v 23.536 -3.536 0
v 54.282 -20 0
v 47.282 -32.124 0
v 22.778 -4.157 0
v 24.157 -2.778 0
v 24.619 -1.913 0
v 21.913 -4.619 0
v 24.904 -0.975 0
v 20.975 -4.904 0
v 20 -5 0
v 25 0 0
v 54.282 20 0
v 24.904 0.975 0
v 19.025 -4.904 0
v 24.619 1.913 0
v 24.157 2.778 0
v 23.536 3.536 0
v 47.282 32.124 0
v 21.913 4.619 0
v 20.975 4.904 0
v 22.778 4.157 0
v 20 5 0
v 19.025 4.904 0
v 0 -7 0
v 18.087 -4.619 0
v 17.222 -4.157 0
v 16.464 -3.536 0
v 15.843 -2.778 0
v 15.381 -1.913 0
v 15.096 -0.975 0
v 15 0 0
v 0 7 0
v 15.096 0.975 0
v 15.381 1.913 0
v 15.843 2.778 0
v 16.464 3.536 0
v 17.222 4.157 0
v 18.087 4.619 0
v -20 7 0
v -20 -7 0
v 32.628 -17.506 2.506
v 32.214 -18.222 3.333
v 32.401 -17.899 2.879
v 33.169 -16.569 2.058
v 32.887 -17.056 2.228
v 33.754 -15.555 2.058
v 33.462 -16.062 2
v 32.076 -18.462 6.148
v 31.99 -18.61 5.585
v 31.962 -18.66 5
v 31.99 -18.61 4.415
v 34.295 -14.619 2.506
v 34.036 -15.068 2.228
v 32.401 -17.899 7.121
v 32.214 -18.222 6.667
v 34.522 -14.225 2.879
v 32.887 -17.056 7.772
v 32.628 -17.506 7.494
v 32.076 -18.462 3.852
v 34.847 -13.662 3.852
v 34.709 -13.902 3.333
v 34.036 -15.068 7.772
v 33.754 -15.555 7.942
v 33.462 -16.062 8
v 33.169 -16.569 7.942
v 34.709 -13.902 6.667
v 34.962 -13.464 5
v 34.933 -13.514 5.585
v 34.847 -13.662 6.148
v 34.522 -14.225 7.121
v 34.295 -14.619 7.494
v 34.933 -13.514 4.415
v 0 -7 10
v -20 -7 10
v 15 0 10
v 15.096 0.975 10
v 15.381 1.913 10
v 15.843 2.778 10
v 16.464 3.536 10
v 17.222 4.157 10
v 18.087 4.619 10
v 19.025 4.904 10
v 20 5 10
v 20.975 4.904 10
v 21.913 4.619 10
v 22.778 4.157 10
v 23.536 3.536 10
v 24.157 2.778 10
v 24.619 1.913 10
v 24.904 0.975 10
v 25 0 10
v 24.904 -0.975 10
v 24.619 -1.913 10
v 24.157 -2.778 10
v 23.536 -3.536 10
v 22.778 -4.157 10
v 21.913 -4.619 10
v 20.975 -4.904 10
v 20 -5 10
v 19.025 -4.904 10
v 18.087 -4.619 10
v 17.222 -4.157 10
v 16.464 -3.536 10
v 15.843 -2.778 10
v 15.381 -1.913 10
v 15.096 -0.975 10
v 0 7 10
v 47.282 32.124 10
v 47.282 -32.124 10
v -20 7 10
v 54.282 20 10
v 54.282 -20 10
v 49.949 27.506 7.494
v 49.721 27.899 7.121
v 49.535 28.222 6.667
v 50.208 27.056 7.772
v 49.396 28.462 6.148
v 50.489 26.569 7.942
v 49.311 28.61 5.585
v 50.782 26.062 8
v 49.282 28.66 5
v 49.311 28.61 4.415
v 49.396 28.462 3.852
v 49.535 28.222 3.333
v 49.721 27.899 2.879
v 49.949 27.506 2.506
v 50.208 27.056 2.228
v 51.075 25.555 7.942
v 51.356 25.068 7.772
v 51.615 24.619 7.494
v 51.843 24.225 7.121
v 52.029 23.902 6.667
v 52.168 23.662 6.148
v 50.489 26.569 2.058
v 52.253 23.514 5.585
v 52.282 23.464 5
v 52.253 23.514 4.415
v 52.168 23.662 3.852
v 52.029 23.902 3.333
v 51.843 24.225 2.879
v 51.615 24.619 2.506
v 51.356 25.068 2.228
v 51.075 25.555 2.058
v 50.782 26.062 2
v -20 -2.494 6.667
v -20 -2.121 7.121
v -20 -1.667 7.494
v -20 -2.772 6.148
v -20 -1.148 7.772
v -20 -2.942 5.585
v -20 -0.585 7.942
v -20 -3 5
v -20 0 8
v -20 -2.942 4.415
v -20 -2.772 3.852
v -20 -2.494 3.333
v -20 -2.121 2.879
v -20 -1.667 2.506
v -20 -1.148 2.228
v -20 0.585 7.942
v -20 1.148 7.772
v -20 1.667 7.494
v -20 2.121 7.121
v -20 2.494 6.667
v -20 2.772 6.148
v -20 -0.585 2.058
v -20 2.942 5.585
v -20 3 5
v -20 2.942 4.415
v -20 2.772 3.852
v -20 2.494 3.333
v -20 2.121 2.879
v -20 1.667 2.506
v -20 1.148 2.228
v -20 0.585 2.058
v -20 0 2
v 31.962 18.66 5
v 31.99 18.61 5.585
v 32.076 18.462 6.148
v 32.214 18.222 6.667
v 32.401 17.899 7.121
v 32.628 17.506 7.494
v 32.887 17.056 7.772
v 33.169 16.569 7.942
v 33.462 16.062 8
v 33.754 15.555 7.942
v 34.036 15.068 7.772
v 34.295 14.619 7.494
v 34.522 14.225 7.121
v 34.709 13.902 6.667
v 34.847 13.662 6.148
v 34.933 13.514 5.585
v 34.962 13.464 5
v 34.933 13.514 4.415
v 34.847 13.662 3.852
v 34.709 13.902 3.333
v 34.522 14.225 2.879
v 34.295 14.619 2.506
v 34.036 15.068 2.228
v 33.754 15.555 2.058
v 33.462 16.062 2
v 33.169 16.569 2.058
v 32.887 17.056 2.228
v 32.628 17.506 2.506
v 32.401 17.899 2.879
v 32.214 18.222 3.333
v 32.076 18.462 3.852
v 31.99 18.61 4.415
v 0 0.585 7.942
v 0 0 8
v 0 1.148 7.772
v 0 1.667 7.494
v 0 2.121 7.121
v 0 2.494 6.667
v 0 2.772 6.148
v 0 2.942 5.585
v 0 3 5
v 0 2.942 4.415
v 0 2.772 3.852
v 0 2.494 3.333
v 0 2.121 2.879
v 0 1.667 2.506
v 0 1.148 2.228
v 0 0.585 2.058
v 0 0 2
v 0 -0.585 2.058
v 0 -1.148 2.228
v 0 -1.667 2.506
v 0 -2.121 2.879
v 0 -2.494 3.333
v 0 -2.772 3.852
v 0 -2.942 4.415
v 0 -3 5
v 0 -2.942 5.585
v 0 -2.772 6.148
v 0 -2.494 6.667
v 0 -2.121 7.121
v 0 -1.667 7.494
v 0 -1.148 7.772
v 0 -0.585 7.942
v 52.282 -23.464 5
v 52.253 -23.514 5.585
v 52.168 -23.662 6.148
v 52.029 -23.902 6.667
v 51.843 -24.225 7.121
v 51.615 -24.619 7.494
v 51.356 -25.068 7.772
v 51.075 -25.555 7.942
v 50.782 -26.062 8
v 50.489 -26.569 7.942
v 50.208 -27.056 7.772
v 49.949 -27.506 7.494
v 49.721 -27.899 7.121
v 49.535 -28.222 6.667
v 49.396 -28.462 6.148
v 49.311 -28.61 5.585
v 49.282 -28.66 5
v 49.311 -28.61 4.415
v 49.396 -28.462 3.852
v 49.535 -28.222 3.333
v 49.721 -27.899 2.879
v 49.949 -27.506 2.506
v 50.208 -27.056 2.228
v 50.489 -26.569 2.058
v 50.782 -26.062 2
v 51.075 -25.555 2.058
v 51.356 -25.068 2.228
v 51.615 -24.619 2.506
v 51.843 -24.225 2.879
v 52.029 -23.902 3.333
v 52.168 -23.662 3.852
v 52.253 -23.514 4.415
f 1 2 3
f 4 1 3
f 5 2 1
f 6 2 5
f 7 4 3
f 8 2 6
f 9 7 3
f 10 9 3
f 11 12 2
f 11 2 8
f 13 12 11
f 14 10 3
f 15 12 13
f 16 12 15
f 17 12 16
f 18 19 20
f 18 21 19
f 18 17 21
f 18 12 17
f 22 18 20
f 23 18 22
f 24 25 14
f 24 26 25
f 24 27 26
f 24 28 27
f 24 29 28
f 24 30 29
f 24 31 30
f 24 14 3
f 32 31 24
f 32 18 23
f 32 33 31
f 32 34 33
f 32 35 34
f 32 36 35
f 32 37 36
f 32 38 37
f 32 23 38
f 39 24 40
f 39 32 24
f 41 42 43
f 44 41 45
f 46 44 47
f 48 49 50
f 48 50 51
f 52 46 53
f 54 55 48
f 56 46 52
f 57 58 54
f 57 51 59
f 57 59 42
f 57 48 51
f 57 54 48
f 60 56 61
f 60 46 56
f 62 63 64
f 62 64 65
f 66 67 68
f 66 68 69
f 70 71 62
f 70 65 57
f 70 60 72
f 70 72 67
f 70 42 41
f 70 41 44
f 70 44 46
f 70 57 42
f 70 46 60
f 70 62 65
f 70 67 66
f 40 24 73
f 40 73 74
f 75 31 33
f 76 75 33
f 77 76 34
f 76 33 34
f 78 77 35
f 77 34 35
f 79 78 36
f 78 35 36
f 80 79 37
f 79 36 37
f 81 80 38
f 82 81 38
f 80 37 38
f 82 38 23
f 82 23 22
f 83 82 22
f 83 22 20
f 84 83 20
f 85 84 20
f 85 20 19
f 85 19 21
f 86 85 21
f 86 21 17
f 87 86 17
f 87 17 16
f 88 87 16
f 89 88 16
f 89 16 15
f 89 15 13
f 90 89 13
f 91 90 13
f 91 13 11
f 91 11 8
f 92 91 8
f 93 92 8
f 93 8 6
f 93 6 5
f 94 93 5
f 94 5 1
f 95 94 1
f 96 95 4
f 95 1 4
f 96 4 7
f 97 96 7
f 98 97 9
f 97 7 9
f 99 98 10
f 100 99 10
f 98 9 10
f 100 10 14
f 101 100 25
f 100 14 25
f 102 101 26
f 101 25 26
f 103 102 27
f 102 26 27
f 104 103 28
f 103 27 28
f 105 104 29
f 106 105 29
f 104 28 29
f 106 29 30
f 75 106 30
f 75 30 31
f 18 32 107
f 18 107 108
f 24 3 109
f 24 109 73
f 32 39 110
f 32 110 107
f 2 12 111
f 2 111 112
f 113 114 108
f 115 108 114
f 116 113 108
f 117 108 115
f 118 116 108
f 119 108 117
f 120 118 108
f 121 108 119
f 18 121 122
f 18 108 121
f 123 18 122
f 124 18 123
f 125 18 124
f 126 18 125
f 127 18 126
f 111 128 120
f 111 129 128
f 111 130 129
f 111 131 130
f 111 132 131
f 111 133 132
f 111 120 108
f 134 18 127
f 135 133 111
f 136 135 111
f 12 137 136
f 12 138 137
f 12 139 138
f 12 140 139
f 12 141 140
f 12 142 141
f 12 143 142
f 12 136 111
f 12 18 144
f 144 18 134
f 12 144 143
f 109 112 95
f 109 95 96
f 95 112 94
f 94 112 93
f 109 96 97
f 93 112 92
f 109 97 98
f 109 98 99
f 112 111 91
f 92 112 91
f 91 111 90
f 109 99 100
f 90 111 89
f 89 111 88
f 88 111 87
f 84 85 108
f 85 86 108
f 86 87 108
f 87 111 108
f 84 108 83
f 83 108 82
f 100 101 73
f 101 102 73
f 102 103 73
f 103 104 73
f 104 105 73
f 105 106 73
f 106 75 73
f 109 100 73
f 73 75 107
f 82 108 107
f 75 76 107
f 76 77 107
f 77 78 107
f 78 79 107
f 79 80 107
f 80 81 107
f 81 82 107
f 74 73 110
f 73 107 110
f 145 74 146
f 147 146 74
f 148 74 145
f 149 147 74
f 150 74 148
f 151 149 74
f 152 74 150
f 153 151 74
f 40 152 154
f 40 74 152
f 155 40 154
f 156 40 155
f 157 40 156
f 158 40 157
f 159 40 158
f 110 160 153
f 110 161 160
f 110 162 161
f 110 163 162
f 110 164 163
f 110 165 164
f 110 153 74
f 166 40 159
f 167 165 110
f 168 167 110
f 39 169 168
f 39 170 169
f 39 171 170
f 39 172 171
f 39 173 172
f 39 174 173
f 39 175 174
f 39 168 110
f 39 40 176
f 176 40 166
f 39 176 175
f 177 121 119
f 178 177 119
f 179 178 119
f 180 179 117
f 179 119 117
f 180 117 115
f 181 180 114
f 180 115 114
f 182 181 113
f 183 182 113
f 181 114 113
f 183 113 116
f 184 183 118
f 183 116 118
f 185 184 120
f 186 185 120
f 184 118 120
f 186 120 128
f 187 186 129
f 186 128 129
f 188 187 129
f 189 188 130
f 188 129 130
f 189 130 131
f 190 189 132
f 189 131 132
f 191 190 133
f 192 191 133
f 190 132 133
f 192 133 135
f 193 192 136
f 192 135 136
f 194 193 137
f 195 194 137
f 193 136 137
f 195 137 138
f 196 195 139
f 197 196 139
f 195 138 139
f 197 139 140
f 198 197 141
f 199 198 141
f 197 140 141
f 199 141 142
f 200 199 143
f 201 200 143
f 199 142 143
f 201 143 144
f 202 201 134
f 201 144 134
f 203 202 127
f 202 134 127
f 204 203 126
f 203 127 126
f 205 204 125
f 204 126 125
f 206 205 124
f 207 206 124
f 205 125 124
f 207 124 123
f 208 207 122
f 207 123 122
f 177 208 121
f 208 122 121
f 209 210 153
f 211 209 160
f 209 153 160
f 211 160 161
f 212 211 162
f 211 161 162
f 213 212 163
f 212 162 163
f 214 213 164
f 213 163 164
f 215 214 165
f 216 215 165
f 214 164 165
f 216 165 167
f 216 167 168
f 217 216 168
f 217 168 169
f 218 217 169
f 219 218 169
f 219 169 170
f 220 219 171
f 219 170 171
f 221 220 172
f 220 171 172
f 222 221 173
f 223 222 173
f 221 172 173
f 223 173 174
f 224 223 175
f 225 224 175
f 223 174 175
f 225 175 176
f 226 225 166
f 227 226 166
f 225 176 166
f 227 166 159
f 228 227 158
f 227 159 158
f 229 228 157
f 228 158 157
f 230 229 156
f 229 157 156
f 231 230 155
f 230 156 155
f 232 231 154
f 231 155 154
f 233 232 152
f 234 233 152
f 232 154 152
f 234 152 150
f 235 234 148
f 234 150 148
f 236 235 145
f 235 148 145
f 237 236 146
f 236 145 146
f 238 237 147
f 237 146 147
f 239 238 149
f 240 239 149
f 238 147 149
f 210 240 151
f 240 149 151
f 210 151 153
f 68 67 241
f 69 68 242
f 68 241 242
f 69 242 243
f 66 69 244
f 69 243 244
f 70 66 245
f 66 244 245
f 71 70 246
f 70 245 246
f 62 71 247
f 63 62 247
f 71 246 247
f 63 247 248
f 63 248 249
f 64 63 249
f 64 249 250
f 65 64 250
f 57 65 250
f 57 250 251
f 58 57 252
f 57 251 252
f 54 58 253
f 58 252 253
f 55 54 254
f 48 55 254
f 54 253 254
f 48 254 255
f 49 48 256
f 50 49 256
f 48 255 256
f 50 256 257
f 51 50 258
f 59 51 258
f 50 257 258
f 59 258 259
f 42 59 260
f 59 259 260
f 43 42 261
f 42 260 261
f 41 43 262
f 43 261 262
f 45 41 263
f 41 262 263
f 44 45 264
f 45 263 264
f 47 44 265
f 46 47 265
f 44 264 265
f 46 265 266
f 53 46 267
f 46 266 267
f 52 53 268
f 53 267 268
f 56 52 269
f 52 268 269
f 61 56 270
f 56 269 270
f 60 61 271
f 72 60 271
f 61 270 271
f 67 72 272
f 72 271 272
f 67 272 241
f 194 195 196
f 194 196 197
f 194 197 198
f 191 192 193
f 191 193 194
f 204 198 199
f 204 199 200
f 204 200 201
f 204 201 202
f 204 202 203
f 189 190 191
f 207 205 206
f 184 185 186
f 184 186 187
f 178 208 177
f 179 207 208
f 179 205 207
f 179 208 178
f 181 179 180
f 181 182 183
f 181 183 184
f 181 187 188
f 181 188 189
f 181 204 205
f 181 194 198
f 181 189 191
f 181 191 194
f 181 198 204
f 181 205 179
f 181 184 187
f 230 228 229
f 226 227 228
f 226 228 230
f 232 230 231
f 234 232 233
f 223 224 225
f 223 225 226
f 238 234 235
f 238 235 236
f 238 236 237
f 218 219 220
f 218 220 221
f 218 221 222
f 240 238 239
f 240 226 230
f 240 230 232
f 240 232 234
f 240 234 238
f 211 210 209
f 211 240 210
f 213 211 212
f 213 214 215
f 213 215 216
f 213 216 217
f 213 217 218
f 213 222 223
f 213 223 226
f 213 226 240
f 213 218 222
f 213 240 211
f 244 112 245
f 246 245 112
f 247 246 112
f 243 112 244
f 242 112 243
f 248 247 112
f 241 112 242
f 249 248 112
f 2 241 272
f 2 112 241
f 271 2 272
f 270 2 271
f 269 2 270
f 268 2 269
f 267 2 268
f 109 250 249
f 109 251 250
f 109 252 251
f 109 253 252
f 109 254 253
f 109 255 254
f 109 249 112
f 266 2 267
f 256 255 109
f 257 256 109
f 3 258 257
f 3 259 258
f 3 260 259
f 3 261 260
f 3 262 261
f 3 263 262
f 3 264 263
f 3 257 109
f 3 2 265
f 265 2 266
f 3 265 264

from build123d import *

# Parameters (mm, degrees)
BOSS_EXTRU_2_DEPTH      = 10
ESQUISSE4_R             = 3
ENL_V_MAT_EXTRU_3_DEPTH = 20
ESQUISSE6_R             = 3
ENL_V_MAT_EXTRU_4_DEPTH = 20
ESQUISSE7_R             = 3
ENL_V_MAT_EXTRU_5_DEPTH = 20
ESQUISSE8_R             = 5
ENL_V_MAT_EXTRU_6_DEPTH = 20


with BuildPart() as part:
    # Esquisse1 → Boss.-Extru.2 (new body)
    with BuildSketch(Plane.XY):
        Polygon((-20, -7), (-20, 7), (0, 7), (47.282032303, 32.124355653), (54.282032303, 20), (54.282032303, -20), (47.282032303, -32.124355653), (0, -7), align=None)
    extrude(amount=BOSS_EXTRU_2_DEPTH)

    # Esquisse4 → Enlèv. mat.-Extru.3 (cut)
    with BuildSketch(Plane.ZY.offset(20)):
        with Locations((5, 0)):
            Circle(ESQUISSE4_R)
    extrude(amount=-ENL_V_MAT_EXTRU_3_DEPTH, mode=Mode.SUBTRACT)

    # Esquisse6 → Enlèv. mat.-Extru.4 (cut)
    with BuildSketch(Plane(origin=(49.371778265, 28.504809472, 0), x_dir=(0.4999999999999953, -0.8660254037844415, 0), z_dir=(0.8660254037844415, 0.4999999999999953, 0))):
        with Locations(Location((2.820508076, -5, 0), (0, 0, 180))):
            Circle(ESQUISSE6_R)
    extrude(amount=-ENL_V_MAT_EXTRU_4_DEPTH, mode=Mode.SUBTRACT)

    # Esquisse7 → Enlèv. mat.-Extru.5 (cut)
    with BuildSketch(Plane(origin=(49.371778265, -28.504809472, 0), x_dir=(-0.5000000000000256, -0.8660254037844237, 0), z_dir=(0.8660254037844238, -0.5000000000000258, 0))):
        with Locations(Location((-2.820508076, -5, 0), (0, 0, 180))):
            Circle(ESQUISSE7_R)
    extrude(amount=-ENL_V_MAT_EXTRU_5_DEPTH, mode=Mode.SUBTRACT)

    # Esquisse8 → Enlèv. mat.-Extru.6 (cut)
    with BuildSketch(Plane(origin=(0, 0, 0), x_dir=(-1, 0, 0), z_dir=(0, 0, -1))):
        with Locations((-20, 0)):
            Circle(ESQUISSE8_R)
    extrude(amount=-ENL_V_MAT_EXTRU_6_DEPTH, mode=Mode.SUBTRACT)


solid = part.part
